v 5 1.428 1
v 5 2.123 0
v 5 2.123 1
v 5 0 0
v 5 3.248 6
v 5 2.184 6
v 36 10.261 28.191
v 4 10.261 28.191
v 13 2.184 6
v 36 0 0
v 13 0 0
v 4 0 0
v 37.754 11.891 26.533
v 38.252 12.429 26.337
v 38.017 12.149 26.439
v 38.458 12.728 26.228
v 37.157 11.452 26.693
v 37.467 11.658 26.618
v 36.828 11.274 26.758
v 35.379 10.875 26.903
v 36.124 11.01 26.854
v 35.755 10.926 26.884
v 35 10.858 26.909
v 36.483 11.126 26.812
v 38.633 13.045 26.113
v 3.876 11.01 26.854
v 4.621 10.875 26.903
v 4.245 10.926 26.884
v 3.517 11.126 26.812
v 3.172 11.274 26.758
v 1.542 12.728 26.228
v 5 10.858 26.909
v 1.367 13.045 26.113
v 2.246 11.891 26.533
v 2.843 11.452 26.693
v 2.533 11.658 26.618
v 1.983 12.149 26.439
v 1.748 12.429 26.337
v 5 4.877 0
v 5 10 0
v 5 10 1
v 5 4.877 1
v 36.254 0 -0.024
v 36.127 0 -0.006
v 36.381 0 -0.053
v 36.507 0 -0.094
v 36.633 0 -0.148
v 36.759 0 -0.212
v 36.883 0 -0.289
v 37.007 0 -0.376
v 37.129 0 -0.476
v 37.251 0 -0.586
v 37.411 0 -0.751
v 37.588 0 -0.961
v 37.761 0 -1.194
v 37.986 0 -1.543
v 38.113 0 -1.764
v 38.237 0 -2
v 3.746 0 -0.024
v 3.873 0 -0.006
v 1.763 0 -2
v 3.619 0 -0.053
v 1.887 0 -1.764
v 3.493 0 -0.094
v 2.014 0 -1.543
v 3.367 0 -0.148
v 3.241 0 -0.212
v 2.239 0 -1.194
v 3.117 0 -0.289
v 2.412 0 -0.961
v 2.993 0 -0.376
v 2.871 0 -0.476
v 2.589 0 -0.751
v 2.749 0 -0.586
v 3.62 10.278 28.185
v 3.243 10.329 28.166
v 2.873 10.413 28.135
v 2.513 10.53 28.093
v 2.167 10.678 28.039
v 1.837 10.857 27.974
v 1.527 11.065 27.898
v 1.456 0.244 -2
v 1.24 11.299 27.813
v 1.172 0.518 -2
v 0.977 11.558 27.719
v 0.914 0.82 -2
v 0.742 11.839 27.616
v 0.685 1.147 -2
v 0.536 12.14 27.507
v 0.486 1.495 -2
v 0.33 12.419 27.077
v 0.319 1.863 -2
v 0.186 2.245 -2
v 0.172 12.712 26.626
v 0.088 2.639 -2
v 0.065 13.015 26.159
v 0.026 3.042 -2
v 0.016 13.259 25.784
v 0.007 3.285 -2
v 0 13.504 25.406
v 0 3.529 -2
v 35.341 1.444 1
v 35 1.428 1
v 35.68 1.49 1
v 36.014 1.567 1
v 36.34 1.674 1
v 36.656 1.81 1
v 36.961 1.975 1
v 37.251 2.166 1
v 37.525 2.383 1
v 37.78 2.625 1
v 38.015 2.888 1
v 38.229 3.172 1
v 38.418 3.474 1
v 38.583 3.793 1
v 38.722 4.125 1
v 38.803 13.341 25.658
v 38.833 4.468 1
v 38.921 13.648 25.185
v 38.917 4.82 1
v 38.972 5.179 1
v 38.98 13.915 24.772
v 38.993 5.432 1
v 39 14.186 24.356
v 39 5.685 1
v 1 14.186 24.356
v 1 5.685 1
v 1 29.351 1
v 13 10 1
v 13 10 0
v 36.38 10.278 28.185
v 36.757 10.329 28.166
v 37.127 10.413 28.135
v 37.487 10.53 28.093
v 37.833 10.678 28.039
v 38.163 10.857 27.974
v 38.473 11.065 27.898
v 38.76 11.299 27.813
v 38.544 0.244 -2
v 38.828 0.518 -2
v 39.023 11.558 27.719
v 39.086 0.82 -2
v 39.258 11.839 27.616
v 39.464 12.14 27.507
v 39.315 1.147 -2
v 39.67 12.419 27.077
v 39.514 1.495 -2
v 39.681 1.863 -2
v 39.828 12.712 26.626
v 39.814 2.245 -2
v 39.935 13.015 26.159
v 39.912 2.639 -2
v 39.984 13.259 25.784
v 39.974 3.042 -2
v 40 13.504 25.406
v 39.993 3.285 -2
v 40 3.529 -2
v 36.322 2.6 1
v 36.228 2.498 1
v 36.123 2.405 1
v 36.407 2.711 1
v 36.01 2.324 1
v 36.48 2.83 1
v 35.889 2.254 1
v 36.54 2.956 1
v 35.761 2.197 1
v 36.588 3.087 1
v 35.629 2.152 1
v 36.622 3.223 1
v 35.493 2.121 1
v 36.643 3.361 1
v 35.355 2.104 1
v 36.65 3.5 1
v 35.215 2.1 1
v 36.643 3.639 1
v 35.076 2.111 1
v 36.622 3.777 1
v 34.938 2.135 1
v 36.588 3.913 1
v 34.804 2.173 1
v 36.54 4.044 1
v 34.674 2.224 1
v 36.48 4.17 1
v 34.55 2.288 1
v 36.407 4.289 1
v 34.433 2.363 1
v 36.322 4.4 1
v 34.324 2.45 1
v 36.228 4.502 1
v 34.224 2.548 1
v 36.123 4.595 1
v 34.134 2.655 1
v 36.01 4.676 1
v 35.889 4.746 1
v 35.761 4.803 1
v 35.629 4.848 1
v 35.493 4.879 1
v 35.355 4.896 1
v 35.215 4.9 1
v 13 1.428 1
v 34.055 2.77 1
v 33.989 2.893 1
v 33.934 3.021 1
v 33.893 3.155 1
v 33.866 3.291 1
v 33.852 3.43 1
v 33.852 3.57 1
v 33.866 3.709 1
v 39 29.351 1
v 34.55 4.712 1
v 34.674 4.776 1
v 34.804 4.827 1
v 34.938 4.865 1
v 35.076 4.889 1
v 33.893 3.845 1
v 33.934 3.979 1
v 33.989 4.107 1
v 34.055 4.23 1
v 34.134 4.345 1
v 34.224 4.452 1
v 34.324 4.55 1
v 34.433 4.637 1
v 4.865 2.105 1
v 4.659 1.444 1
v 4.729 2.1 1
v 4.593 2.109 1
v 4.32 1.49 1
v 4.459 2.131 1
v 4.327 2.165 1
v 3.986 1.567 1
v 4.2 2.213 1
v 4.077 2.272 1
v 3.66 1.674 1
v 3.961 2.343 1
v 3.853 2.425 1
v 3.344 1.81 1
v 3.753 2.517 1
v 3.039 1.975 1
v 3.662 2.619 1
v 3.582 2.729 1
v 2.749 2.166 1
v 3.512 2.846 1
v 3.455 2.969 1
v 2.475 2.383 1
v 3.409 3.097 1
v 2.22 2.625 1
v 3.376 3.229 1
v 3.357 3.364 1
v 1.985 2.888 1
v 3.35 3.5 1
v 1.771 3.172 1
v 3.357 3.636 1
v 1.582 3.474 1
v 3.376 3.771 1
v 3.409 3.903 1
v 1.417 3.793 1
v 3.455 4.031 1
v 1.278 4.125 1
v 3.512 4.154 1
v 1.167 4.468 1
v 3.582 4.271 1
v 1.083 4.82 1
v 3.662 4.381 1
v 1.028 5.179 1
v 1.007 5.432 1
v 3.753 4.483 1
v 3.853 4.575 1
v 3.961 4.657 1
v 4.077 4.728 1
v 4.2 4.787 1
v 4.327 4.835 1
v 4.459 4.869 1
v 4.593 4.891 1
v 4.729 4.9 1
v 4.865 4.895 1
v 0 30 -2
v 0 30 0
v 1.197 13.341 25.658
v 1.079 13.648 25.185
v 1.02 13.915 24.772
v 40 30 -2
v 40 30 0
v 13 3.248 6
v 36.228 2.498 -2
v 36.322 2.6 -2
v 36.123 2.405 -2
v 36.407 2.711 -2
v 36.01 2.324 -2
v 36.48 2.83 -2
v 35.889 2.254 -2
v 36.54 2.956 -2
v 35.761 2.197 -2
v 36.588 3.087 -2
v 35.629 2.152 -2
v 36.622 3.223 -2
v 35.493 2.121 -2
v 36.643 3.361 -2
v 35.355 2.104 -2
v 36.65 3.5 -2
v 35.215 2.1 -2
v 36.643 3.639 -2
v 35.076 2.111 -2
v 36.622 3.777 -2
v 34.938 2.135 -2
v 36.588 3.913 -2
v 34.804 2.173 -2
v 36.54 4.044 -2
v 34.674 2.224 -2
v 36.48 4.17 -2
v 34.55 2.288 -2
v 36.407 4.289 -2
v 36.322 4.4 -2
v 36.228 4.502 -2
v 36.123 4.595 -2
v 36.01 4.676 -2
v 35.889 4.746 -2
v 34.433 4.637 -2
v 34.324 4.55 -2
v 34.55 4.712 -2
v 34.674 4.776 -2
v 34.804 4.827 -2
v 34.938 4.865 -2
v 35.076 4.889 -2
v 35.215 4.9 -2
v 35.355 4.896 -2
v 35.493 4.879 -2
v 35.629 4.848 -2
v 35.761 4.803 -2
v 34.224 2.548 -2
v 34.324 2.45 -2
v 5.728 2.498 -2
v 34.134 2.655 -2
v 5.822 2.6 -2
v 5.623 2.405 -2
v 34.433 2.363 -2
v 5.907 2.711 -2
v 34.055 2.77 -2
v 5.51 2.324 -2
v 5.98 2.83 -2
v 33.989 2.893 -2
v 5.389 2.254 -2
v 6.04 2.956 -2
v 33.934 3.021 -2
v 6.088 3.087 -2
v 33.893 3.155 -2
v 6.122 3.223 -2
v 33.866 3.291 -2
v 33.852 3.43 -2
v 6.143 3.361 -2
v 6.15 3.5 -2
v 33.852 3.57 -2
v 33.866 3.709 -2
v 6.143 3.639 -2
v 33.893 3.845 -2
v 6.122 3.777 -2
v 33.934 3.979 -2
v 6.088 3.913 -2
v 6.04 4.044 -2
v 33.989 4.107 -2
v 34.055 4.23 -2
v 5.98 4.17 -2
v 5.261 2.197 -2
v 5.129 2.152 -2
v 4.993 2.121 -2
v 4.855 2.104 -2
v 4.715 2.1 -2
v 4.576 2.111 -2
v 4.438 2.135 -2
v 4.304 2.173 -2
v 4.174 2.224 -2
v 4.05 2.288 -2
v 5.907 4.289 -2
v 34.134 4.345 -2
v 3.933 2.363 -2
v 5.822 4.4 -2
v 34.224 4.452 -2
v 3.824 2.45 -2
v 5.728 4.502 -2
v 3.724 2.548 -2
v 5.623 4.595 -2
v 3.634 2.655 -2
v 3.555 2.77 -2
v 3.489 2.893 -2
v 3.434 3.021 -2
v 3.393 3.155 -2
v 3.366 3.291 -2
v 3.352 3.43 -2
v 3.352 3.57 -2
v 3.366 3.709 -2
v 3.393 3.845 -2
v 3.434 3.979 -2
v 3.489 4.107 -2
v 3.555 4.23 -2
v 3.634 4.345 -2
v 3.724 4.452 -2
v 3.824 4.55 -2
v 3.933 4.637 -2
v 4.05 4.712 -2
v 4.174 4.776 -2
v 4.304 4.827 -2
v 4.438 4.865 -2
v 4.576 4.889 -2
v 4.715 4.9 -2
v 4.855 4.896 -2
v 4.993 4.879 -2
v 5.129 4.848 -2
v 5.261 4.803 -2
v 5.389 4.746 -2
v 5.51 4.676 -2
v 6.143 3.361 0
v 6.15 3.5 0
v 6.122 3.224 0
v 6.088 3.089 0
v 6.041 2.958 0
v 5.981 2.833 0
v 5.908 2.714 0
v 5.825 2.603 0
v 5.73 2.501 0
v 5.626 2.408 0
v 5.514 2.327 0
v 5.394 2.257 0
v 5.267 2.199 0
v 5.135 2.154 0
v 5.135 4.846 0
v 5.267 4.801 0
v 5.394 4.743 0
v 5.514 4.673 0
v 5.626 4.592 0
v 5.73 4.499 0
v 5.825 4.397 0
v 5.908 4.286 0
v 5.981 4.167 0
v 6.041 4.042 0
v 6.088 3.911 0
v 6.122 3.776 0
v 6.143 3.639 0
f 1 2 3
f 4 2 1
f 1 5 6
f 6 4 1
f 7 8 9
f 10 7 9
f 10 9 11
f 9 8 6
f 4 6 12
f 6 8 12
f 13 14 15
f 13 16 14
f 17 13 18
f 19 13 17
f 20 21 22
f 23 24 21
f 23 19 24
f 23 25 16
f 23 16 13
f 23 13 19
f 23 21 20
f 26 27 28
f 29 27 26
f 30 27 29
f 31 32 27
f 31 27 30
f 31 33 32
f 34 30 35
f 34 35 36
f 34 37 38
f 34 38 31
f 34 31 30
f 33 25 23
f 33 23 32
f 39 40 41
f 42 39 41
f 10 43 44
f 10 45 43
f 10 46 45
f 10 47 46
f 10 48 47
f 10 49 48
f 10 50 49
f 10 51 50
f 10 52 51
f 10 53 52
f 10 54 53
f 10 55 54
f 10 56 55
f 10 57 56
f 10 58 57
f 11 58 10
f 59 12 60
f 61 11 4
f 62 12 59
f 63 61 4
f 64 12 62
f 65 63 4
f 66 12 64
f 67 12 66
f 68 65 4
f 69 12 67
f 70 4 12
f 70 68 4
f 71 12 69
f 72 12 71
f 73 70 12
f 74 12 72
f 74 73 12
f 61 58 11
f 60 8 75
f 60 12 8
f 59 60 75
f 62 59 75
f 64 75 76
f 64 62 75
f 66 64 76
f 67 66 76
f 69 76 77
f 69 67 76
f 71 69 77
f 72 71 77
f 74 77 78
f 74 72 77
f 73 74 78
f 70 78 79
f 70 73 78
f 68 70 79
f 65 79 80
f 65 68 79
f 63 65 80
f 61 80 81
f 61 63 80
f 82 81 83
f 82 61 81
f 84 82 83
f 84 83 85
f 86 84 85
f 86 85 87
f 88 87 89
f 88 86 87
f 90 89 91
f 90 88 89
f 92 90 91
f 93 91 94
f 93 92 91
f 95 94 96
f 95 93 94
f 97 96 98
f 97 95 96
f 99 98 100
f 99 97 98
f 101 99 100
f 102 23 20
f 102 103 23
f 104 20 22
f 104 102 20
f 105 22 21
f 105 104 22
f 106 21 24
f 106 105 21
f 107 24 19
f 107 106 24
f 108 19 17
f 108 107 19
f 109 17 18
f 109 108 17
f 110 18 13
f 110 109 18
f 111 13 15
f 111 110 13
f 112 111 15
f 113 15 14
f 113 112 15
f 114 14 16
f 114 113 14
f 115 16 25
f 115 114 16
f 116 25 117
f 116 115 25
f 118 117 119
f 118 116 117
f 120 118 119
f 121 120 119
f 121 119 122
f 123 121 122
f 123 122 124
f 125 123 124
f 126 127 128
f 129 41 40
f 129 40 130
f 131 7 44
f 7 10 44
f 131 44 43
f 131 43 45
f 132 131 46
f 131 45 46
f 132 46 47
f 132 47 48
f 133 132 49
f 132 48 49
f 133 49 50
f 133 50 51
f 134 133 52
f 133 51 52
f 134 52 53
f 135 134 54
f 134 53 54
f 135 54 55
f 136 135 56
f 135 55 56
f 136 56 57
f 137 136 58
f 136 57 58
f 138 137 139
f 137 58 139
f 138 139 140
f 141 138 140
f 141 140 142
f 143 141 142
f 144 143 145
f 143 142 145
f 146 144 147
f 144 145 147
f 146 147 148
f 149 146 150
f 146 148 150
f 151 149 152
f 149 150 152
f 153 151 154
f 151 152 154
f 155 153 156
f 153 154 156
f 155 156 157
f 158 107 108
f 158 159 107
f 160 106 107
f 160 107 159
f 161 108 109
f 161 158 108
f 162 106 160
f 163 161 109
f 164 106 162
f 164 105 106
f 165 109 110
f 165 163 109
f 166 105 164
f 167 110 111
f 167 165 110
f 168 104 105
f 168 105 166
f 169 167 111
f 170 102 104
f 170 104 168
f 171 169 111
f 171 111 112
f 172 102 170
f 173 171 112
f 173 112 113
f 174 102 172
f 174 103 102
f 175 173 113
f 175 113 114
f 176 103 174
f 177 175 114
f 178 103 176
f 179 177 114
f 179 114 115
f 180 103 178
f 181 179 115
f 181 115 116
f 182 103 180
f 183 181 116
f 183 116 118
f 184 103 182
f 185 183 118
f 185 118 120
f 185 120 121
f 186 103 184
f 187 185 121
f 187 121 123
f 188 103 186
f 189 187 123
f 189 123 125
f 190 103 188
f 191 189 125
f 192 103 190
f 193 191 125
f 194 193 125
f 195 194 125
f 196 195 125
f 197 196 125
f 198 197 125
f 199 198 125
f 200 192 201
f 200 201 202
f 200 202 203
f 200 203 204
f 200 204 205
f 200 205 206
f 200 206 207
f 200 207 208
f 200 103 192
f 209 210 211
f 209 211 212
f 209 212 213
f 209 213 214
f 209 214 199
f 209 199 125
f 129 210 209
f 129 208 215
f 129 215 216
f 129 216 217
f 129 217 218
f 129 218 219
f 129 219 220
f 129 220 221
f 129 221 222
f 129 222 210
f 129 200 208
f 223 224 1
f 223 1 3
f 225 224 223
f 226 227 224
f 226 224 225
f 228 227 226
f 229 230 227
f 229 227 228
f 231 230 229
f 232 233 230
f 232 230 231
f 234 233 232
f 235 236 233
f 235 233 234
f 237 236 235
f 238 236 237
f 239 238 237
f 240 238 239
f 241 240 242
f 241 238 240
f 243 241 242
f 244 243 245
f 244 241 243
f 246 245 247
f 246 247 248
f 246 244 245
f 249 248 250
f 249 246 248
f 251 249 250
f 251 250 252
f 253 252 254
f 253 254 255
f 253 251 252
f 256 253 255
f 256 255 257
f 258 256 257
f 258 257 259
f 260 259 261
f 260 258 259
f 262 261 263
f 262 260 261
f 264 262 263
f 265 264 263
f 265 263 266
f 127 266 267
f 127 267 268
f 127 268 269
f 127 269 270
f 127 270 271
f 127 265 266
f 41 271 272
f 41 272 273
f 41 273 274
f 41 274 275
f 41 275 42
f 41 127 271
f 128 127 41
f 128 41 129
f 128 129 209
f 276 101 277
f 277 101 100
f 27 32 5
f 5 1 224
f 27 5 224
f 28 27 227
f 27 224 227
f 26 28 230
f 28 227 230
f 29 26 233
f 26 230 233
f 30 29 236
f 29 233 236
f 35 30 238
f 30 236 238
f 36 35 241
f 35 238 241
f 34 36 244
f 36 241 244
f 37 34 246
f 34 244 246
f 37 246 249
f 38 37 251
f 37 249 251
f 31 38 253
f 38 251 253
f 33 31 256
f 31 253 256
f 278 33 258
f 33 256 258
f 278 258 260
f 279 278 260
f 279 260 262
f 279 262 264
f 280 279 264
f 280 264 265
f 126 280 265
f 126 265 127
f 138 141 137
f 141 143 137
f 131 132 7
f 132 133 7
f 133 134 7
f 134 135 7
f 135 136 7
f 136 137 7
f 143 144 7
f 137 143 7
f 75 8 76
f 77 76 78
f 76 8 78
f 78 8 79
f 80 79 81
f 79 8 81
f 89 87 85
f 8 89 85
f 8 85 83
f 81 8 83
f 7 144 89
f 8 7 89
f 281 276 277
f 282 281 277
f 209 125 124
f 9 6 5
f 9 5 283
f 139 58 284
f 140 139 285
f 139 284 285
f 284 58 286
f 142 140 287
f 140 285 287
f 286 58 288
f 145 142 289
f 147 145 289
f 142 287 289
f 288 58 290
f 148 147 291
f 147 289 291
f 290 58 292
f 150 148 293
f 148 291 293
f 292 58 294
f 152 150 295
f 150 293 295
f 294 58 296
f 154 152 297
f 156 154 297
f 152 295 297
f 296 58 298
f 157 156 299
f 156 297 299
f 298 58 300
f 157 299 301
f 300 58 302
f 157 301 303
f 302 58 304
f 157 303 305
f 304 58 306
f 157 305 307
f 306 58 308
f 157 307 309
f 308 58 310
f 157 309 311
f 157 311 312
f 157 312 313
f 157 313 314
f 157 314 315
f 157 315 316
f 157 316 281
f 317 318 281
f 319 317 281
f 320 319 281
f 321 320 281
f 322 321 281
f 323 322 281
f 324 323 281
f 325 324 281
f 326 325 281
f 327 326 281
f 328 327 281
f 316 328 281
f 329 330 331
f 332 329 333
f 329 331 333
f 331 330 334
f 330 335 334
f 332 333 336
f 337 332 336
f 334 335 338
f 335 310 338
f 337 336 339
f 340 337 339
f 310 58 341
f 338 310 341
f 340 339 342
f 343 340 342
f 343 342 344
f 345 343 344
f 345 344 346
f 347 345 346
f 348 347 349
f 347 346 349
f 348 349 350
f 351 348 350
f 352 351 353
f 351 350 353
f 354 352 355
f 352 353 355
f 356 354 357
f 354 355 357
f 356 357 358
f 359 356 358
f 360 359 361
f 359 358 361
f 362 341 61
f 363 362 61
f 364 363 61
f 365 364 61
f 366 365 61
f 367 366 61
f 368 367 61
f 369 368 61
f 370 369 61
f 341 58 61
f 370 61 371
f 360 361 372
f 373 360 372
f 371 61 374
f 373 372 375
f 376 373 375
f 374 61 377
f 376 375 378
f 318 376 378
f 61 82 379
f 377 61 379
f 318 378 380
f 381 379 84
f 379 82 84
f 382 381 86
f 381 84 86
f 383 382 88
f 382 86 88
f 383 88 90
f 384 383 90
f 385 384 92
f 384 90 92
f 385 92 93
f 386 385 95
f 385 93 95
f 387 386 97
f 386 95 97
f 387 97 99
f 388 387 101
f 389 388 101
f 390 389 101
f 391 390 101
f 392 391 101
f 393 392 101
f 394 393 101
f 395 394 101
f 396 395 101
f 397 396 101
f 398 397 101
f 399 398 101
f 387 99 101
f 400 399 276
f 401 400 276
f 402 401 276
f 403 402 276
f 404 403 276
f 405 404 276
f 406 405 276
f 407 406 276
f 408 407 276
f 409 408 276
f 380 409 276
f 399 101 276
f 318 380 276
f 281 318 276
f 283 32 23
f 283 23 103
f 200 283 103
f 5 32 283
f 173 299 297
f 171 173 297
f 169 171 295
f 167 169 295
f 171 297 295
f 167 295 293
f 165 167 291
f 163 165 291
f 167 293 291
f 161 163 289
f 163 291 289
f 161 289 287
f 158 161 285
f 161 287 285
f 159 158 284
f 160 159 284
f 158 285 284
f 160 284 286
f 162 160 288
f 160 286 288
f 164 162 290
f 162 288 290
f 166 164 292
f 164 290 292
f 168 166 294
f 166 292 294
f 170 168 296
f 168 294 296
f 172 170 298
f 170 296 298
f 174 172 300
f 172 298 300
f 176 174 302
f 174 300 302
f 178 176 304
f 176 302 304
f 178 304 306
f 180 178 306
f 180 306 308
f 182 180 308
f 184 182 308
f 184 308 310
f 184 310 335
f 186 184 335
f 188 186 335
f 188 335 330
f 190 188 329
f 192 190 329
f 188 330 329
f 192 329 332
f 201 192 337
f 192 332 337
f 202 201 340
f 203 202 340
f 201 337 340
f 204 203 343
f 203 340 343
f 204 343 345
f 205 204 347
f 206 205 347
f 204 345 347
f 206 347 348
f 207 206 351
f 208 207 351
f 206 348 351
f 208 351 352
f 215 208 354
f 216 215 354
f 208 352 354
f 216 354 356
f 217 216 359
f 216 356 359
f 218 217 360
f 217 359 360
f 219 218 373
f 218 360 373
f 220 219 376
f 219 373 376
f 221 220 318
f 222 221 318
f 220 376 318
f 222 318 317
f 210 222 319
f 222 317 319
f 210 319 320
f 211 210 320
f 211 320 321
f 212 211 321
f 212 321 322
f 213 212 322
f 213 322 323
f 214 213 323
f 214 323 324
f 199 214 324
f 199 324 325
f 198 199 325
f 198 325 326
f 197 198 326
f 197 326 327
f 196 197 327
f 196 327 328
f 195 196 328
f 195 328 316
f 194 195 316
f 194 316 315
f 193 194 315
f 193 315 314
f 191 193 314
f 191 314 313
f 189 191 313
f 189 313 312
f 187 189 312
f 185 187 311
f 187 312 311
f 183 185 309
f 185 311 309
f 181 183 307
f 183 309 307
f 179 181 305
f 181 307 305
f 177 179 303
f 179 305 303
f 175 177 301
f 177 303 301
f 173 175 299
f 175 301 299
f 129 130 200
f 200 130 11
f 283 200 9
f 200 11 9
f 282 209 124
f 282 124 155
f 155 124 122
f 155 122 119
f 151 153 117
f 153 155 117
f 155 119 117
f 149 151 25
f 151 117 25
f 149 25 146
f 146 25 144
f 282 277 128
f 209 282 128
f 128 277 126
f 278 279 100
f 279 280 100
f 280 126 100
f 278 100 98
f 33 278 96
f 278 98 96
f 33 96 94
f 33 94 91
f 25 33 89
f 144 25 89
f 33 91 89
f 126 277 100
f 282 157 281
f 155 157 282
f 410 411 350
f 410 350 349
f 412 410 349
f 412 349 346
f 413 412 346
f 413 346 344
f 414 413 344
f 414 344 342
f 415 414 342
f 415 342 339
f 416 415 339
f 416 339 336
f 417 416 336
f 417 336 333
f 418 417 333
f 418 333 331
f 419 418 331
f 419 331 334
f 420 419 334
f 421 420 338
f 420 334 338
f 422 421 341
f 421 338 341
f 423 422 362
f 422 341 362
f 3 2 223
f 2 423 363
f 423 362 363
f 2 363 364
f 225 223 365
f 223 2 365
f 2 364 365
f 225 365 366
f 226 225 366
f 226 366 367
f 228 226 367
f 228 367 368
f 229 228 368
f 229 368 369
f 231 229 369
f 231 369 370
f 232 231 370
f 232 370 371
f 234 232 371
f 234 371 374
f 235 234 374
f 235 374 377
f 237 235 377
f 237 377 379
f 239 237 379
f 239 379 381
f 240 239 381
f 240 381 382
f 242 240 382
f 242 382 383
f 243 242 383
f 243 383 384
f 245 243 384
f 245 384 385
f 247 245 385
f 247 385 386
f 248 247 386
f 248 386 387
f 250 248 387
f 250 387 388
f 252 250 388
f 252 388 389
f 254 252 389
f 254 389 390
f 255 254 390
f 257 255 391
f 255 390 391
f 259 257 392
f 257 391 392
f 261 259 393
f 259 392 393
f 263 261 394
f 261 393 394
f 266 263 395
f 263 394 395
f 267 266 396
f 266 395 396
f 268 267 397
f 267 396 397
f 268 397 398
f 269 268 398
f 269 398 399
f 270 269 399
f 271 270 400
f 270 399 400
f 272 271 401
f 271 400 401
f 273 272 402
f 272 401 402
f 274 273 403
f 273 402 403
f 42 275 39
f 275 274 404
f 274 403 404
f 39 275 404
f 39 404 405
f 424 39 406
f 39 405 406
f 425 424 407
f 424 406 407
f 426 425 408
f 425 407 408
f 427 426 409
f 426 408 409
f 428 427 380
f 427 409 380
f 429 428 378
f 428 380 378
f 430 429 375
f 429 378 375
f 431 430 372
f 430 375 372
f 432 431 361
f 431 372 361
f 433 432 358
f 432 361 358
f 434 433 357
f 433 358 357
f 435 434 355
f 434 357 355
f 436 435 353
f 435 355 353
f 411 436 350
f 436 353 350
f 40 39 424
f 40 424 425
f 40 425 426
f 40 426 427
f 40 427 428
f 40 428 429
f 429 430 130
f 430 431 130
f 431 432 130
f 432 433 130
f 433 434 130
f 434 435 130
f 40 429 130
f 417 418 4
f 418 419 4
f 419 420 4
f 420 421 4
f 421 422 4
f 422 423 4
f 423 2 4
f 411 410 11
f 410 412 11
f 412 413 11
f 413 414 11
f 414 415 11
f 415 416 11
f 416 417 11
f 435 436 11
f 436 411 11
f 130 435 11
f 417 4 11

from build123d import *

# Parameters (mm, degrees)
F1_DEPTH = 40
F2_T     = -1
F0_W     = 30
F0_H     = 2
F3_DEPTH = 40
F4_W     = 8
F4_H     = 6
F5_DEPTH = 10
F6_R     = 1.4
F7_DEPTH = 3
F8_R     = 4


with BuildPart() as f1:
    # F0 (on Right) → F1 (new body)
    with BuildSketch(Plane.YZ):
        Polygon((10.2606042998, 28.1907786236), (0, 0), (30, 0), (12.1399895413, 27.5067383369), align=None)
    extrude(amount=F1_DEPTH)

    # F2
    f2_openings = [f1.faces().sort_by_distance(p)[0] for p in [
        (20, 21.069995, 13.753369),
    ]]
    offset(amount=F2_T, openings=f2_openings, kind=Kind.INTERSECTION)

    # F0 (on Right) → F3 (join)
    with BuildSketch(Plane.YZ):
        with Locations((15, -1)):
            Rectangle(F0_W, F0_H)
    extrude(amount=F3_DEPTH)

    # F4 (on Front) → F5 (cut)
    with BuildSketch(Plane.XZ):
        with Locations((9, 3)):
            Rectangle(F4_W, F4_H)
    extrude(amount=-F5_DEPTH, mode=Mode.SUBTRACT)

    # F6 (on face) → F7 (cut)
    with BuildSketch(Plane(origin=(0, 0, -2), x_dir=(1, 0, 0), z_dir=(0, 0, -1))):
        with Locations((4.75, -3.5)):
            Circle(F6_R)
        with Locations((35.25, -3.5)):
            Circle(F6_R)
    extrude(amount=-F7_DEPTH, mode=Mode.SUBTRACT)

    # F8
    f8_edges = [f1.edges().sort_by_distance(p)[0] for p in [
        (1, 6.143212, 13.954533),
        (39, 6.143212, 13.954533),
        (0, 5.130302, 14.095389),
        (40, 5.130302, 14.095389),
    ]]
    fillet(f8_edges, radius=F8_R)


solid = f1.part
